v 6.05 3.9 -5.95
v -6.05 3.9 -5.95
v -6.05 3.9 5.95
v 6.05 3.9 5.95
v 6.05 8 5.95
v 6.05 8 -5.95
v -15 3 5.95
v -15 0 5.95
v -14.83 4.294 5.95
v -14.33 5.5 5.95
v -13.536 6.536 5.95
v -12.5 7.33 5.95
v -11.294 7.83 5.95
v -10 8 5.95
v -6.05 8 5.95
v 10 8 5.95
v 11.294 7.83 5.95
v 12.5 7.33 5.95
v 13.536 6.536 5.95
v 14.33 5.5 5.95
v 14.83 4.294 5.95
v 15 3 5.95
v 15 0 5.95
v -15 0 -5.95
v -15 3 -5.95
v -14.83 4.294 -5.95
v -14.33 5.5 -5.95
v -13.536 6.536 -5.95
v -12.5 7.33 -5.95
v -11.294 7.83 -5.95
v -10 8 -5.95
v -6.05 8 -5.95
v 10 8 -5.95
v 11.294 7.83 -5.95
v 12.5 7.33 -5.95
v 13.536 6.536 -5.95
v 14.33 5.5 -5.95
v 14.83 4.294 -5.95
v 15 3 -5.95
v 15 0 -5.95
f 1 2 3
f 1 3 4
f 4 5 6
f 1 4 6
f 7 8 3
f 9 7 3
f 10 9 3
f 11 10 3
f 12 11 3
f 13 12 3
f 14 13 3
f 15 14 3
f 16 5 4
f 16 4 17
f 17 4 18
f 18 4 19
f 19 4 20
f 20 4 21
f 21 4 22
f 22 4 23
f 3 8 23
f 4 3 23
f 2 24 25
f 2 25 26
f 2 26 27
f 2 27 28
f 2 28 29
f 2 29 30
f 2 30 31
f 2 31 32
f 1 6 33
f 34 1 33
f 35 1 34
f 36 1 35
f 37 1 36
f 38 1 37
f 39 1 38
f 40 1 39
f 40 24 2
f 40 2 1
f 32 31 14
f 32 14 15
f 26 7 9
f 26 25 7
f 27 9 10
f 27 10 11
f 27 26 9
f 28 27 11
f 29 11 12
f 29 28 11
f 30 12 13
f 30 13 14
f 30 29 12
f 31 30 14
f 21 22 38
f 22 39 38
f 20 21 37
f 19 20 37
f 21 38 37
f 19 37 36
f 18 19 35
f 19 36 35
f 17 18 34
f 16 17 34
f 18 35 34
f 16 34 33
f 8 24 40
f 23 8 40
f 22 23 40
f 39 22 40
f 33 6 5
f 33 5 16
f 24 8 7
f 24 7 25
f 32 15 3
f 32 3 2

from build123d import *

# Parameters (mm, degrees)
SKETCH1_W           = 30
SKETCH1_H           = 11.9
BOSS_EXTRUDE1_DEPTH = 8
SKETCH3_W           = 12.1
SKETCH3_H           = 11.9
CUT_EXTRUDE1_DEPTH  = 4.1
FILLET1_R           = 5


with BuildPart() as part:
    # Sketch1 → Boss-Extrude1 (new body)
    with BuildSketch(Plane(origin=(0, 0, 0), x_dir=(1, 0, 0), z_dir=(0, 1, 0))):
        Rectangle(SKETCH1_W, SKETCH1_H)
    extrude(amount=BOSS_EXTRUDE1_DEPTH)

    # Sketch3 → Cut-Extrude1 (cut)
    with BuildSketch(Plane(origin=(0, 8, 0), x_dir=(1, 0, 0), z_dir=(0, 1, 0))):
        Rectangle(SKETCH3_W, SKETCH3_H)
    extrude(amount=-CUT_EXTRUDE1_DEPTH, mode=Mode.SUBTRACT)

    # Fillet1
    fillet1_edges = [part.edges().sort_by_distance(p)[0] for p in [
        (15, 8, 0),
        (-15, 8, 0),
    ]]
    fillet(fillet1_edges, radius=FILLET1_R)


solid = part.part
